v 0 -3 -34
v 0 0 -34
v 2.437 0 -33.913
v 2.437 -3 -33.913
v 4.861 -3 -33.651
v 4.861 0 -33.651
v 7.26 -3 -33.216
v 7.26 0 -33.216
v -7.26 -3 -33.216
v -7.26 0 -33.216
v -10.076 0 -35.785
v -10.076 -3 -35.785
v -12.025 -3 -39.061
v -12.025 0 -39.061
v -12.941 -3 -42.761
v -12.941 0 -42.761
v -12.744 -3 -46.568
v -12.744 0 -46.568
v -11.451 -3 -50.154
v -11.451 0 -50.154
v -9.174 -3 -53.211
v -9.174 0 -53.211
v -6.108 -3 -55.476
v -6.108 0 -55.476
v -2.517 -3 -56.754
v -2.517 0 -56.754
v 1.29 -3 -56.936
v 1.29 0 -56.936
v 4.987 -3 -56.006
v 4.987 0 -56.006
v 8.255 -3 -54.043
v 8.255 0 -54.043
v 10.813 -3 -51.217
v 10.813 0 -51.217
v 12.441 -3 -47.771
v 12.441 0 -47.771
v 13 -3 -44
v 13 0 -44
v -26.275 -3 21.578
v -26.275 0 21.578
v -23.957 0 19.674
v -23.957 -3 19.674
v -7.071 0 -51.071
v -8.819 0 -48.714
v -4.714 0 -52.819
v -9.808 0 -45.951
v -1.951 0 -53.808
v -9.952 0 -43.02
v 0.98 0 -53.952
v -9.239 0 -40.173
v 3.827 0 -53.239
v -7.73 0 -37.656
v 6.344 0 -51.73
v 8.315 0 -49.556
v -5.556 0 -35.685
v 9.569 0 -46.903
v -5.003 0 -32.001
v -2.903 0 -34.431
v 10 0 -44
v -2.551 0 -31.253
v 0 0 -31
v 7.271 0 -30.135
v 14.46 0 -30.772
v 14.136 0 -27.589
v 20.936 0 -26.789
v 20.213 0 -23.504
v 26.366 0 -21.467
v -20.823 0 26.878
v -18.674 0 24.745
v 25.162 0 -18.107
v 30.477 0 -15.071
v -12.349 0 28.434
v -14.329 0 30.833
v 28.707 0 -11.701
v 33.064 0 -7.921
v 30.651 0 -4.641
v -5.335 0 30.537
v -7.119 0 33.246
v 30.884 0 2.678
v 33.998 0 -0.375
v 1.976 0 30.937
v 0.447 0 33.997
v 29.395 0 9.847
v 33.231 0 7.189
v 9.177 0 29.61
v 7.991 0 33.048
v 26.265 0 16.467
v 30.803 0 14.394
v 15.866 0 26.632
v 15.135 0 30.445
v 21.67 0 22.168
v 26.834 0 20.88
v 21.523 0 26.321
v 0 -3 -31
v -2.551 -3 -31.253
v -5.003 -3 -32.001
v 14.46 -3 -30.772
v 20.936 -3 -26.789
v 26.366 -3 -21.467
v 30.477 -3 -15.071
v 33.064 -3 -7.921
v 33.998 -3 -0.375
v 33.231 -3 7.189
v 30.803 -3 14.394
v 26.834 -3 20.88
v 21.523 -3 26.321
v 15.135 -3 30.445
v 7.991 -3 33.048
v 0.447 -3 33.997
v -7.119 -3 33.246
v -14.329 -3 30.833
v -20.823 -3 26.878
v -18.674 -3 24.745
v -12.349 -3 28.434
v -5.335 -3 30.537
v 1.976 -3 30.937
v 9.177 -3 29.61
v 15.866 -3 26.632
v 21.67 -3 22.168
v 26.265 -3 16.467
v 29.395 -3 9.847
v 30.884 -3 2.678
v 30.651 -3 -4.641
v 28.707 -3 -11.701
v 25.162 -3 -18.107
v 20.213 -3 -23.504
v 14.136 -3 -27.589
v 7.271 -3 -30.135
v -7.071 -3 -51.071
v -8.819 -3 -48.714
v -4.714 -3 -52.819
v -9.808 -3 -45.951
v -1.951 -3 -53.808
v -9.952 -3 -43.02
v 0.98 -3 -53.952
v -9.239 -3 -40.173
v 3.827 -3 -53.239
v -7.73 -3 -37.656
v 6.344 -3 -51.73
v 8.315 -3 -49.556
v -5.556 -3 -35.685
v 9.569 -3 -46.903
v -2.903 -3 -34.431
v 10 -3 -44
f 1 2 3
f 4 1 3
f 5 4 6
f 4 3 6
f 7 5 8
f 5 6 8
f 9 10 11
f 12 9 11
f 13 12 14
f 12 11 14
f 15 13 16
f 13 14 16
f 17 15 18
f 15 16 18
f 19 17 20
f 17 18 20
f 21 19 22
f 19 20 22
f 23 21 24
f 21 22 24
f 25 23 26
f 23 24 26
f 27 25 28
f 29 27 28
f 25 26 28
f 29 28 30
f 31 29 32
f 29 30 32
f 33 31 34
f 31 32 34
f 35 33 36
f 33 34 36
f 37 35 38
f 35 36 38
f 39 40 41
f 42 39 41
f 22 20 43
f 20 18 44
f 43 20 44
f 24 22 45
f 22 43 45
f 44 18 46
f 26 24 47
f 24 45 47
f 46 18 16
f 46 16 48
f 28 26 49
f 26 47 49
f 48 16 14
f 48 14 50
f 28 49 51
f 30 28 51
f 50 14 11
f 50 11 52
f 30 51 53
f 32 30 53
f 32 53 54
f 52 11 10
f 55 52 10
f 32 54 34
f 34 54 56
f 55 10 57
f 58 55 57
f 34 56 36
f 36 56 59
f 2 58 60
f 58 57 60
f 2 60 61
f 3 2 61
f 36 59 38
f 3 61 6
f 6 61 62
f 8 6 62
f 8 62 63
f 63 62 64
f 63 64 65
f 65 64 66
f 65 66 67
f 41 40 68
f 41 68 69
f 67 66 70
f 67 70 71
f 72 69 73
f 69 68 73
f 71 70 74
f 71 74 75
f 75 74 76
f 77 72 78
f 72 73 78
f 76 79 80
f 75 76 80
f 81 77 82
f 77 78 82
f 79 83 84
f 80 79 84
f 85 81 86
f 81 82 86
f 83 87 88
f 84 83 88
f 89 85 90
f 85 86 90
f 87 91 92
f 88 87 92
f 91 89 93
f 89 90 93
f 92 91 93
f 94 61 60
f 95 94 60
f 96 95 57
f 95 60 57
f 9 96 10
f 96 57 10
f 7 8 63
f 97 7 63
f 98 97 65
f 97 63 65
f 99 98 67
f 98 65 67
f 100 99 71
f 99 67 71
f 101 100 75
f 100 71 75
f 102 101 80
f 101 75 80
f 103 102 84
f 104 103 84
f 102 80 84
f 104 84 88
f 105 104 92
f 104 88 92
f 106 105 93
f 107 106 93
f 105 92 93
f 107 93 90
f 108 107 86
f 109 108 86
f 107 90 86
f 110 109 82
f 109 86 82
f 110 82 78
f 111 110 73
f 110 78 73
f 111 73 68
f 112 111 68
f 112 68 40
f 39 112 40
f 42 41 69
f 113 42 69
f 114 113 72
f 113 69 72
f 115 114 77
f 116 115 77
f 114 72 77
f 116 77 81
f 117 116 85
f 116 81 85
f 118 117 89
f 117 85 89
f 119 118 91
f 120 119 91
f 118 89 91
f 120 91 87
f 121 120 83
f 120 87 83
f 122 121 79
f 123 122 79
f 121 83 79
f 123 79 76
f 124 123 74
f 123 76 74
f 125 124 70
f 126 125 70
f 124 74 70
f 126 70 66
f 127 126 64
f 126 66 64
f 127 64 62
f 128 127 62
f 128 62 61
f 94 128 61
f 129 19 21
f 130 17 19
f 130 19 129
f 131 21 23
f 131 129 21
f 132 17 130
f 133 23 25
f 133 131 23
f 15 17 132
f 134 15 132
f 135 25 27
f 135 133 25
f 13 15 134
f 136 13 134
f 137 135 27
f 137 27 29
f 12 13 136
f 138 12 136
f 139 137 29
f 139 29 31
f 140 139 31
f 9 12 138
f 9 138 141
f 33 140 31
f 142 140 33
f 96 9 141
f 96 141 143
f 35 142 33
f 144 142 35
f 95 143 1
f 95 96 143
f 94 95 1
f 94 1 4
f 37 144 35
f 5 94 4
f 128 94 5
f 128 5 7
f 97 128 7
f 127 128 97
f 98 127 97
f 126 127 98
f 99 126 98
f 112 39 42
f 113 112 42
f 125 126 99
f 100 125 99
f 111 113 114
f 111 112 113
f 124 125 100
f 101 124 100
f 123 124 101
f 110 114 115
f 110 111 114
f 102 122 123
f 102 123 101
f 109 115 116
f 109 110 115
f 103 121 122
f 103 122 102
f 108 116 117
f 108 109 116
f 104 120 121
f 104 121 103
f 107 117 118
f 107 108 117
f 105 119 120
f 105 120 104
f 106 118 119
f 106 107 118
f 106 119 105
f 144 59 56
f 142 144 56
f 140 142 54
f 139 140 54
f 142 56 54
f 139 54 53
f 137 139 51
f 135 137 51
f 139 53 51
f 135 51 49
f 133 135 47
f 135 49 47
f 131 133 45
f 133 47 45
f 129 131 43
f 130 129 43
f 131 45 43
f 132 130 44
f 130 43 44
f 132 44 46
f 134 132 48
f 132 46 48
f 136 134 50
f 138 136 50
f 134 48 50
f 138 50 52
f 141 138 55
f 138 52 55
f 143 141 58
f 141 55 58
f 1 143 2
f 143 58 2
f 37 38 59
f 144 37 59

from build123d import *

# Parameters (mm, degrees)
F1_DEPTH = 3


with BuildPart() as f1:
    # F0 (on Front) → F1 (new body)
    with BuildSketch(Plane.XZ):
        with BuildLine():
            ThreePointArc((-23.9565223957, 19.6744767327), (10.4486316265, 29.1860599796), (31, 0))
            ThreePointArc((31, 0), (21.9203102168, -21.9203102168), (0, -31))
            ThreePointArc((0, -31), (3.7951823528, -31.5663122562), (7.2597095854, -33.2159090909))
            ThreePointArc((7.2597095854, -33.2159090909), (26.4842417855, -21.3209975622), (34, 0))
            ThreePointArc((34, 0), (11.4597895259, 32.010517397), (-26.2748955308, 21.578458352))
            Line((-26.2748955308, 21.578458352), (-23.9565223957, 19.6744767327))
        make_face()
        with BuildLine():
            ThreePointArc((7.2597095854, -33.2159090909), (3.7951823528, -31.5663122562), (0, -31))
            ThreePointArc((0, -31), (-3.7951823528, -31.5663122562), (-7.2597095854, -33.2159090909))
            ThreePointArc((-7.2597095854, -33.2159090909), (-3.6509650286, -33.8034089163), (-5.1e-08, -34))
            ThreePointArc((-5.1e-08, -34), (3.6509649778, -33.8034089217), (7.2597095854, -33.2159090909))
        make_face()
        with BuildLine():
            ThreePointArc((-5.1e-08, -34), (-3.6509650286, -33.8034089163), (-7.2597095854, -33.2159090909))
            ThreePointArc((-7.2597095854, -33.2159090909), (-6.1083457413, -55.4755440963), (13, -44))
            Line((13, -44), (10, -44))
            ThreePointArc((10, -44), (-7.0710677938, -51.0710678299), (-5.1e-08, -34))
        make_face()
    extrude(amount=F1_DEPTH)


solid = f1.part
